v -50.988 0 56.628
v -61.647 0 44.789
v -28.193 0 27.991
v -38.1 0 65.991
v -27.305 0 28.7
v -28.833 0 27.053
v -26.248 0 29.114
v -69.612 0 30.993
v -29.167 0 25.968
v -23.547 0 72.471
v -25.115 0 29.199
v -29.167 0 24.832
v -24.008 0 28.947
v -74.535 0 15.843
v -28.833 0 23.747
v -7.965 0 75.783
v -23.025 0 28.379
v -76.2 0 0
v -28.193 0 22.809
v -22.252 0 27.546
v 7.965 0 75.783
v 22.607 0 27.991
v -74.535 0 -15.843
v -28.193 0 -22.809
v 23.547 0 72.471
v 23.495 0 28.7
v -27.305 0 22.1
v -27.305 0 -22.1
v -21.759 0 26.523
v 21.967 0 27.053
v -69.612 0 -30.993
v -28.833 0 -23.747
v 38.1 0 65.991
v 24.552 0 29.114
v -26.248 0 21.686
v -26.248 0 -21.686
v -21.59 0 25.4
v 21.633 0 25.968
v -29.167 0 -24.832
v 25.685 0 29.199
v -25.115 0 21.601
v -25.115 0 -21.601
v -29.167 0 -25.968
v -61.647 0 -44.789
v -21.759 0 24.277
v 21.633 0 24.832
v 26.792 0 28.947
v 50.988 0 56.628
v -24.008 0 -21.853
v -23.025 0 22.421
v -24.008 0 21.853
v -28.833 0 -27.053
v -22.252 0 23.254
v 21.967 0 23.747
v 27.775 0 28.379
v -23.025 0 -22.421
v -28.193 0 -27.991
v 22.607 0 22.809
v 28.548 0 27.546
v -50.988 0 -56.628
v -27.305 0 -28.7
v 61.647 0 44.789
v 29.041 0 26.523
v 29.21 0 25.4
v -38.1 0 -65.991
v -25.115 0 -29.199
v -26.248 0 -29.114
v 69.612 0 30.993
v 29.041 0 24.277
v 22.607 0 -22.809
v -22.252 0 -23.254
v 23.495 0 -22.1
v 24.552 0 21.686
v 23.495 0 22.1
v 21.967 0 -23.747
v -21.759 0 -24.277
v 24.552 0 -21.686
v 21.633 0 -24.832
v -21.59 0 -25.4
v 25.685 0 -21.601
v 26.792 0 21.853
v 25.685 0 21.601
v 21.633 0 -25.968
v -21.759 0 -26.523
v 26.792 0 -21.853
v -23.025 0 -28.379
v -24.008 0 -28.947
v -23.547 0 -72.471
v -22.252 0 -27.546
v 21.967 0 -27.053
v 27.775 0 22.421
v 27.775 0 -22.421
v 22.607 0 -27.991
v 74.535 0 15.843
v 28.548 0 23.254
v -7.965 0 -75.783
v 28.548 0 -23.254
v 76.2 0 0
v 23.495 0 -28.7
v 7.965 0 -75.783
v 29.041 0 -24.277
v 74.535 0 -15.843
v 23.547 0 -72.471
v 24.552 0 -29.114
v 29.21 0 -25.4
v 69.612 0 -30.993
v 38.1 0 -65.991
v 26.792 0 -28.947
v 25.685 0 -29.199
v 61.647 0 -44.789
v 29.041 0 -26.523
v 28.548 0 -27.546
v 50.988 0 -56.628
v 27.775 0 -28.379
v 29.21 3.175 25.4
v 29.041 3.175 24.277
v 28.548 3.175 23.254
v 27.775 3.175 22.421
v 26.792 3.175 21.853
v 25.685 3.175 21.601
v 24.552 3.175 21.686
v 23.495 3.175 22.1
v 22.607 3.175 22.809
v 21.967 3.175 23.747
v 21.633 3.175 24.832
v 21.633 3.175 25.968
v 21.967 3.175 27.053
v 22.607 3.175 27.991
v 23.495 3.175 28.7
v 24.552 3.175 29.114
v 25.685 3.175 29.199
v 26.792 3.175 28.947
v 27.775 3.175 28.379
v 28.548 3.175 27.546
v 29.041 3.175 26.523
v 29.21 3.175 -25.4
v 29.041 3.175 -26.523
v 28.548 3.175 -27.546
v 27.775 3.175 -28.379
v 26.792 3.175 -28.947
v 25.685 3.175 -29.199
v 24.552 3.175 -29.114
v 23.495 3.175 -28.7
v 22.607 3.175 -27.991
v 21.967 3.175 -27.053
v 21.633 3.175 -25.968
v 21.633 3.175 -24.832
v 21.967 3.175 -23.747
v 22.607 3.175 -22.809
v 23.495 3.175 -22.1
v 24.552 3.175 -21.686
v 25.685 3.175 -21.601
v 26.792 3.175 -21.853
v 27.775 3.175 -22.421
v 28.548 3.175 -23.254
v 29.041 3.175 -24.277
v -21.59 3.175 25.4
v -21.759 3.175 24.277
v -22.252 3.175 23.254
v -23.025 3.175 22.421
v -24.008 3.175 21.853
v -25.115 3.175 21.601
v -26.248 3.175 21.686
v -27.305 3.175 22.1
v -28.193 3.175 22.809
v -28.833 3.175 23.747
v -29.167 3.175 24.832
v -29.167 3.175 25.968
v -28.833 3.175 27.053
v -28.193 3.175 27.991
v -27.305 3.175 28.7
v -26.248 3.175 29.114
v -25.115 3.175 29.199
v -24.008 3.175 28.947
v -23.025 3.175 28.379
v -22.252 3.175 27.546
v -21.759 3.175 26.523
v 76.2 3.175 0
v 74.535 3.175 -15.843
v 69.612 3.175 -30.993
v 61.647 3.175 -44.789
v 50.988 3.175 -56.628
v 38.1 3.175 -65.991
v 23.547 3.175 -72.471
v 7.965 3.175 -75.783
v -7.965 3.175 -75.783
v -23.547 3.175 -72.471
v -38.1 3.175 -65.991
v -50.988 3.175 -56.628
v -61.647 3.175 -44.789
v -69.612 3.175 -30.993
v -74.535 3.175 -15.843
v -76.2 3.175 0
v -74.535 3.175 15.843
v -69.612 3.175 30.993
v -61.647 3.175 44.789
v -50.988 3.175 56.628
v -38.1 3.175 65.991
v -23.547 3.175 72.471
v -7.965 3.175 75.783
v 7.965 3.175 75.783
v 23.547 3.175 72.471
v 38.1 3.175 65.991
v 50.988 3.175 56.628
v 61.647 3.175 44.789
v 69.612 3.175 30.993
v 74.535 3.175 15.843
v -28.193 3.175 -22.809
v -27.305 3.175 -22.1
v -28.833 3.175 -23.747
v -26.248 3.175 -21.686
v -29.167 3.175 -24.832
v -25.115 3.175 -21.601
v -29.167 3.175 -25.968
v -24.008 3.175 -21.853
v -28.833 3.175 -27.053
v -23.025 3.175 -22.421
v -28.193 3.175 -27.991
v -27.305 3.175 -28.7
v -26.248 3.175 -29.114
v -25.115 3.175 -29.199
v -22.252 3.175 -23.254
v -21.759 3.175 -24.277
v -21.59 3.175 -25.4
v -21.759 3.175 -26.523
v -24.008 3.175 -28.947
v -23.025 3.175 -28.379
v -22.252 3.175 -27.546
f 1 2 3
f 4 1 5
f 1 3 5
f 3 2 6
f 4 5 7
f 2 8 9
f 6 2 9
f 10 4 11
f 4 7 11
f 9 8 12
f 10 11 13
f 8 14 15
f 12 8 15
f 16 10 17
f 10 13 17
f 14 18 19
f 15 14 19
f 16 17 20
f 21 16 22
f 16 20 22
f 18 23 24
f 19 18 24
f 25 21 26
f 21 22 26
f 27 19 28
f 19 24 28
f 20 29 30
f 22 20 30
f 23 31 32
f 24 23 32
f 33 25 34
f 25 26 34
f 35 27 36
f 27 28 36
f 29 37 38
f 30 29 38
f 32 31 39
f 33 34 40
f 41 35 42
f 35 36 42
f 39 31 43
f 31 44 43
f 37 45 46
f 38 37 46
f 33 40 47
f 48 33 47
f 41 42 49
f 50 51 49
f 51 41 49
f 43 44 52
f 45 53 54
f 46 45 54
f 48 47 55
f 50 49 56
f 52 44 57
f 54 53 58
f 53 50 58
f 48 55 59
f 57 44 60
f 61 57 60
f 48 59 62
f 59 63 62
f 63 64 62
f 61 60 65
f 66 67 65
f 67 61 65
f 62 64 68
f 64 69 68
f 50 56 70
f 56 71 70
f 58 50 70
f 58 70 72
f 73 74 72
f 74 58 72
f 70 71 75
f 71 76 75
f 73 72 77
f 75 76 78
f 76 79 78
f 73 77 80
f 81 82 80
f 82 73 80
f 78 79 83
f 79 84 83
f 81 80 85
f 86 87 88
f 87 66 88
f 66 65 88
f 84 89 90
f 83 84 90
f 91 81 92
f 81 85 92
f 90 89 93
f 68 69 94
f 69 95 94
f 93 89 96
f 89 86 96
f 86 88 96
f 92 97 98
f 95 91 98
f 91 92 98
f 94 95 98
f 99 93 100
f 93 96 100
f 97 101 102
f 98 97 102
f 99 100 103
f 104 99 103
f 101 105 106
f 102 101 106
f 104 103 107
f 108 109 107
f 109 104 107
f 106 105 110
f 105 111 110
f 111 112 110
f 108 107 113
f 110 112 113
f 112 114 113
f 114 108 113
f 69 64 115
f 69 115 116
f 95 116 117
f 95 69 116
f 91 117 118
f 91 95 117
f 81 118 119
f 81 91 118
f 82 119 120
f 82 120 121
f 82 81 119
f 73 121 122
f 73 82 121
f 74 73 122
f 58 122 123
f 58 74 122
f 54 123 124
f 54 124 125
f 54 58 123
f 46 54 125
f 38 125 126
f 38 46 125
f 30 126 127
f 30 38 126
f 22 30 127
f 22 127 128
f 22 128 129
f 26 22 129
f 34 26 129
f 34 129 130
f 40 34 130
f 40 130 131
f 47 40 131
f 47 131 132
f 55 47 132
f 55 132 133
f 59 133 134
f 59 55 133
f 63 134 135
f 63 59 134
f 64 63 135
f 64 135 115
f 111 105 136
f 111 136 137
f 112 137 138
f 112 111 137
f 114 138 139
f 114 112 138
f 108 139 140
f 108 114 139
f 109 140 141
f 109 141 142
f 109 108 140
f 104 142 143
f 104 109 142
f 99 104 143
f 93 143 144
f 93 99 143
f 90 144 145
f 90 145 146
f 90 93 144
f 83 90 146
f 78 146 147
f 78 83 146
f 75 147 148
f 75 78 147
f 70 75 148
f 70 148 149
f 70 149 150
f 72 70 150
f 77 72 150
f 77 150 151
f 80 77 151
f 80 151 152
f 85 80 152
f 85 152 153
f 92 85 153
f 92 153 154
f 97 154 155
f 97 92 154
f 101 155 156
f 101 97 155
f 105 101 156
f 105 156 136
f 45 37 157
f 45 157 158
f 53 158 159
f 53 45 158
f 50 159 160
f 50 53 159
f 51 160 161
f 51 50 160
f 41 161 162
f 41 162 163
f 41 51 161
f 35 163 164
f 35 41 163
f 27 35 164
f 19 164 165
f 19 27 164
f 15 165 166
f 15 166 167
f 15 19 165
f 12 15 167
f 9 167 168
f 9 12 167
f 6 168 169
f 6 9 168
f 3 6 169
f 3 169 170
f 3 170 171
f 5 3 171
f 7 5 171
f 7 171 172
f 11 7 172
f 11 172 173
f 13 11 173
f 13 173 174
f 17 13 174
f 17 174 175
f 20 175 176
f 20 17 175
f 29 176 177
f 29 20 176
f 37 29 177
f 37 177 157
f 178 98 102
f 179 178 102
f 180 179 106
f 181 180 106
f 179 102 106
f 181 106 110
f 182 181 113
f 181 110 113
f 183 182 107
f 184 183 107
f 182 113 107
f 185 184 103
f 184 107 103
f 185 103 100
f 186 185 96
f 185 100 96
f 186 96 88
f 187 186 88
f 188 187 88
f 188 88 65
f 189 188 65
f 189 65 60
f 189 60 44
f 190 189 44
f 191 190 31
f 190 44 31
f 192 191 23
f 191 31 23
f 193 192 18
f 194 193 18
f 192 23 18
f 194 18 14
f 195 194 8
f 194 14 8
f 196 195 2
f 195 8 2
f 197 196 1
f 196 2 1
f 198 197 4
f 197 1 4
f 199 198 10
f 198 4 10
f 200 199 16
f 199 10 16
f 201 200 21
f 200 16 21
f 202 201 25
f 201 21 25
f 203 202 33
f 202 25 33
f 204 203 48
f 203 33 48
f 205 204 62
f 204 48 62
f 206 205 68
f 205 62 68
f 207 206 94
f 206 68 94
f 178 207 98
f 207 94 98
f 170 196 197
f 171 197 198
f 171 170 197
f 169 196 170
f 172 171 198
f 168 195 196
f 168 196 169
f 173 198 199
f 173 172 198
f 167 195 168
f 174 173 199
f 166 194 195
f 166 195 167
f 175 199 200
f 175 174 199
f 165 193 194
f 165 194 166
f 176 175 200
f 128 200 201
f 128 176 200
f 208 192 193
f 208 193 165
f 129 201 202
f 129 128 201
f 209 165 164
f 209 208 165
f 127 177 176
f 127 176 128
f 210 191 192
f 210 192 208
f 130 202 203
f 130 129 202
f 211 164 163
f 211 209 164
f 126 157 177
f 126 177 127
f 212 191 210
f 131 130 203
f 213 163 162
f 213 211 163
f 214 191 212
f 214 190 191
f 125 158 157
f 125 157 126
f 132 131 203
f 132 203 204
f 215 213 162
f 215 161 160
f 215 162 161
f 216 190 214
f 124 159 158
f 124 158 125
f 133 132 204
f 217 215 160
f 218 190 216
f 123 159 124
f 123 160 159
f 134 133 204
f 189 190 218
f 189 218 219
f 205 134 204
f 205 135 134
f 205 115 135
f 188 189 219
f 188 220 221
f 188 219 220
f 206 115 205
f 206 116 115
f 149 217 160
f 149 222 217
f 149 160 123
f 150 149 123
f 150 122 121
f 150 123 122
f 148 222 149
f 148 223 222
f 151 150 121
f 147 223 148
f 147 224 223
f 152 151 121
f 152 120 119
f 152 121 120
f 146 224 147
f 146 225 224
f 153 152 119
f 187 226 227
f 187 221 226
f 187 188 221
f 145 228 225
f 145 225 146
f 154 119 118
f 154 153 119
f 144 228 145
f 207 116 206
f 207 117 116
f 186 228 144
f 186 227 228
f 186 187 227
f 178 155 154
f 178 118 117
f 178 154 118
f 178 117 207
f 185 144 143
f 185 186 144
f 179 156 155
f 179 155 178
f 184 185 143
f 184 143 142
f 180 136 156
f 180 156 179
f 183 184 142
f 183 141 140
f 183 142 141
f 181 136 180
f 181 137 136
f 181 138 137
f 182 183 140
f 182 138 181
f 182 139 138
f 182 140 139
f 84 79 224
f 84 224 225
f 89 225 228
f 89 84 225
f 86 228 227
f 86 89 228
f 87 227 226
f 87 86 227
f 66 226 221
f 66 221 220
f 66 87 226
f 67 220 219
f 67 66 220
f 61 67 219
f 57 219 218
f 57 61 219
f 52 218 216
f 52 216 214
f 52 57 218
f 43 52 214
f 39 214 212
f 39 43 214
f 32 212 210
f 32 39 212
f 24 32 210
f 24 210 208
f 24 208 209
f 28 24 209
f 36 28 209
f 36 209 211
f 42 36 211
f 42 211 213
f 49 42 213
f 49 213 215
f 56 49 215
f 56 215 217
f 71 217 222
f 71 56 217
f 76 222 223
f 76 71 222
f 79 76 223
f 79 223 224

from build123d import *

# Parameters (mm, degrees)
SKETCH1_R           = 76.2
SKETCH1_R_2         = 3.81
BOSS_EXTRUDE1_DEPTH = 3.175


with BuildPart() as part:
    # Sketch1 → Boss-Extrude1 (new body)
    with BuildSketch(Plane(origin=(0, 0, 0), x_dir=(1, 0, 0), z_dir=(0, 1, 0))):
        Circle(SKETCH1_R)
        with Locations((-25.4, 25.4)):
            Circle(SKETCH1_R_2, mode=Mode.SUBTRACT)
        with Locations((-25.4, -25.4)):
            Circle(SKETCH1_R_2, mode=Mode.SUBTRACT)
        with Locations((25.4, -25.4)):
            Circle(SKETCH1_R_2, mode=Mode.SUBTRACT)
        with Locations((25.4, 25.4)):
            Circle(SKETCH1_R_2, mode=Mode.SUBTRACT)
    extrude(amount=BOSS_EXTRUDE1_DEPTH)


solid = part.part
